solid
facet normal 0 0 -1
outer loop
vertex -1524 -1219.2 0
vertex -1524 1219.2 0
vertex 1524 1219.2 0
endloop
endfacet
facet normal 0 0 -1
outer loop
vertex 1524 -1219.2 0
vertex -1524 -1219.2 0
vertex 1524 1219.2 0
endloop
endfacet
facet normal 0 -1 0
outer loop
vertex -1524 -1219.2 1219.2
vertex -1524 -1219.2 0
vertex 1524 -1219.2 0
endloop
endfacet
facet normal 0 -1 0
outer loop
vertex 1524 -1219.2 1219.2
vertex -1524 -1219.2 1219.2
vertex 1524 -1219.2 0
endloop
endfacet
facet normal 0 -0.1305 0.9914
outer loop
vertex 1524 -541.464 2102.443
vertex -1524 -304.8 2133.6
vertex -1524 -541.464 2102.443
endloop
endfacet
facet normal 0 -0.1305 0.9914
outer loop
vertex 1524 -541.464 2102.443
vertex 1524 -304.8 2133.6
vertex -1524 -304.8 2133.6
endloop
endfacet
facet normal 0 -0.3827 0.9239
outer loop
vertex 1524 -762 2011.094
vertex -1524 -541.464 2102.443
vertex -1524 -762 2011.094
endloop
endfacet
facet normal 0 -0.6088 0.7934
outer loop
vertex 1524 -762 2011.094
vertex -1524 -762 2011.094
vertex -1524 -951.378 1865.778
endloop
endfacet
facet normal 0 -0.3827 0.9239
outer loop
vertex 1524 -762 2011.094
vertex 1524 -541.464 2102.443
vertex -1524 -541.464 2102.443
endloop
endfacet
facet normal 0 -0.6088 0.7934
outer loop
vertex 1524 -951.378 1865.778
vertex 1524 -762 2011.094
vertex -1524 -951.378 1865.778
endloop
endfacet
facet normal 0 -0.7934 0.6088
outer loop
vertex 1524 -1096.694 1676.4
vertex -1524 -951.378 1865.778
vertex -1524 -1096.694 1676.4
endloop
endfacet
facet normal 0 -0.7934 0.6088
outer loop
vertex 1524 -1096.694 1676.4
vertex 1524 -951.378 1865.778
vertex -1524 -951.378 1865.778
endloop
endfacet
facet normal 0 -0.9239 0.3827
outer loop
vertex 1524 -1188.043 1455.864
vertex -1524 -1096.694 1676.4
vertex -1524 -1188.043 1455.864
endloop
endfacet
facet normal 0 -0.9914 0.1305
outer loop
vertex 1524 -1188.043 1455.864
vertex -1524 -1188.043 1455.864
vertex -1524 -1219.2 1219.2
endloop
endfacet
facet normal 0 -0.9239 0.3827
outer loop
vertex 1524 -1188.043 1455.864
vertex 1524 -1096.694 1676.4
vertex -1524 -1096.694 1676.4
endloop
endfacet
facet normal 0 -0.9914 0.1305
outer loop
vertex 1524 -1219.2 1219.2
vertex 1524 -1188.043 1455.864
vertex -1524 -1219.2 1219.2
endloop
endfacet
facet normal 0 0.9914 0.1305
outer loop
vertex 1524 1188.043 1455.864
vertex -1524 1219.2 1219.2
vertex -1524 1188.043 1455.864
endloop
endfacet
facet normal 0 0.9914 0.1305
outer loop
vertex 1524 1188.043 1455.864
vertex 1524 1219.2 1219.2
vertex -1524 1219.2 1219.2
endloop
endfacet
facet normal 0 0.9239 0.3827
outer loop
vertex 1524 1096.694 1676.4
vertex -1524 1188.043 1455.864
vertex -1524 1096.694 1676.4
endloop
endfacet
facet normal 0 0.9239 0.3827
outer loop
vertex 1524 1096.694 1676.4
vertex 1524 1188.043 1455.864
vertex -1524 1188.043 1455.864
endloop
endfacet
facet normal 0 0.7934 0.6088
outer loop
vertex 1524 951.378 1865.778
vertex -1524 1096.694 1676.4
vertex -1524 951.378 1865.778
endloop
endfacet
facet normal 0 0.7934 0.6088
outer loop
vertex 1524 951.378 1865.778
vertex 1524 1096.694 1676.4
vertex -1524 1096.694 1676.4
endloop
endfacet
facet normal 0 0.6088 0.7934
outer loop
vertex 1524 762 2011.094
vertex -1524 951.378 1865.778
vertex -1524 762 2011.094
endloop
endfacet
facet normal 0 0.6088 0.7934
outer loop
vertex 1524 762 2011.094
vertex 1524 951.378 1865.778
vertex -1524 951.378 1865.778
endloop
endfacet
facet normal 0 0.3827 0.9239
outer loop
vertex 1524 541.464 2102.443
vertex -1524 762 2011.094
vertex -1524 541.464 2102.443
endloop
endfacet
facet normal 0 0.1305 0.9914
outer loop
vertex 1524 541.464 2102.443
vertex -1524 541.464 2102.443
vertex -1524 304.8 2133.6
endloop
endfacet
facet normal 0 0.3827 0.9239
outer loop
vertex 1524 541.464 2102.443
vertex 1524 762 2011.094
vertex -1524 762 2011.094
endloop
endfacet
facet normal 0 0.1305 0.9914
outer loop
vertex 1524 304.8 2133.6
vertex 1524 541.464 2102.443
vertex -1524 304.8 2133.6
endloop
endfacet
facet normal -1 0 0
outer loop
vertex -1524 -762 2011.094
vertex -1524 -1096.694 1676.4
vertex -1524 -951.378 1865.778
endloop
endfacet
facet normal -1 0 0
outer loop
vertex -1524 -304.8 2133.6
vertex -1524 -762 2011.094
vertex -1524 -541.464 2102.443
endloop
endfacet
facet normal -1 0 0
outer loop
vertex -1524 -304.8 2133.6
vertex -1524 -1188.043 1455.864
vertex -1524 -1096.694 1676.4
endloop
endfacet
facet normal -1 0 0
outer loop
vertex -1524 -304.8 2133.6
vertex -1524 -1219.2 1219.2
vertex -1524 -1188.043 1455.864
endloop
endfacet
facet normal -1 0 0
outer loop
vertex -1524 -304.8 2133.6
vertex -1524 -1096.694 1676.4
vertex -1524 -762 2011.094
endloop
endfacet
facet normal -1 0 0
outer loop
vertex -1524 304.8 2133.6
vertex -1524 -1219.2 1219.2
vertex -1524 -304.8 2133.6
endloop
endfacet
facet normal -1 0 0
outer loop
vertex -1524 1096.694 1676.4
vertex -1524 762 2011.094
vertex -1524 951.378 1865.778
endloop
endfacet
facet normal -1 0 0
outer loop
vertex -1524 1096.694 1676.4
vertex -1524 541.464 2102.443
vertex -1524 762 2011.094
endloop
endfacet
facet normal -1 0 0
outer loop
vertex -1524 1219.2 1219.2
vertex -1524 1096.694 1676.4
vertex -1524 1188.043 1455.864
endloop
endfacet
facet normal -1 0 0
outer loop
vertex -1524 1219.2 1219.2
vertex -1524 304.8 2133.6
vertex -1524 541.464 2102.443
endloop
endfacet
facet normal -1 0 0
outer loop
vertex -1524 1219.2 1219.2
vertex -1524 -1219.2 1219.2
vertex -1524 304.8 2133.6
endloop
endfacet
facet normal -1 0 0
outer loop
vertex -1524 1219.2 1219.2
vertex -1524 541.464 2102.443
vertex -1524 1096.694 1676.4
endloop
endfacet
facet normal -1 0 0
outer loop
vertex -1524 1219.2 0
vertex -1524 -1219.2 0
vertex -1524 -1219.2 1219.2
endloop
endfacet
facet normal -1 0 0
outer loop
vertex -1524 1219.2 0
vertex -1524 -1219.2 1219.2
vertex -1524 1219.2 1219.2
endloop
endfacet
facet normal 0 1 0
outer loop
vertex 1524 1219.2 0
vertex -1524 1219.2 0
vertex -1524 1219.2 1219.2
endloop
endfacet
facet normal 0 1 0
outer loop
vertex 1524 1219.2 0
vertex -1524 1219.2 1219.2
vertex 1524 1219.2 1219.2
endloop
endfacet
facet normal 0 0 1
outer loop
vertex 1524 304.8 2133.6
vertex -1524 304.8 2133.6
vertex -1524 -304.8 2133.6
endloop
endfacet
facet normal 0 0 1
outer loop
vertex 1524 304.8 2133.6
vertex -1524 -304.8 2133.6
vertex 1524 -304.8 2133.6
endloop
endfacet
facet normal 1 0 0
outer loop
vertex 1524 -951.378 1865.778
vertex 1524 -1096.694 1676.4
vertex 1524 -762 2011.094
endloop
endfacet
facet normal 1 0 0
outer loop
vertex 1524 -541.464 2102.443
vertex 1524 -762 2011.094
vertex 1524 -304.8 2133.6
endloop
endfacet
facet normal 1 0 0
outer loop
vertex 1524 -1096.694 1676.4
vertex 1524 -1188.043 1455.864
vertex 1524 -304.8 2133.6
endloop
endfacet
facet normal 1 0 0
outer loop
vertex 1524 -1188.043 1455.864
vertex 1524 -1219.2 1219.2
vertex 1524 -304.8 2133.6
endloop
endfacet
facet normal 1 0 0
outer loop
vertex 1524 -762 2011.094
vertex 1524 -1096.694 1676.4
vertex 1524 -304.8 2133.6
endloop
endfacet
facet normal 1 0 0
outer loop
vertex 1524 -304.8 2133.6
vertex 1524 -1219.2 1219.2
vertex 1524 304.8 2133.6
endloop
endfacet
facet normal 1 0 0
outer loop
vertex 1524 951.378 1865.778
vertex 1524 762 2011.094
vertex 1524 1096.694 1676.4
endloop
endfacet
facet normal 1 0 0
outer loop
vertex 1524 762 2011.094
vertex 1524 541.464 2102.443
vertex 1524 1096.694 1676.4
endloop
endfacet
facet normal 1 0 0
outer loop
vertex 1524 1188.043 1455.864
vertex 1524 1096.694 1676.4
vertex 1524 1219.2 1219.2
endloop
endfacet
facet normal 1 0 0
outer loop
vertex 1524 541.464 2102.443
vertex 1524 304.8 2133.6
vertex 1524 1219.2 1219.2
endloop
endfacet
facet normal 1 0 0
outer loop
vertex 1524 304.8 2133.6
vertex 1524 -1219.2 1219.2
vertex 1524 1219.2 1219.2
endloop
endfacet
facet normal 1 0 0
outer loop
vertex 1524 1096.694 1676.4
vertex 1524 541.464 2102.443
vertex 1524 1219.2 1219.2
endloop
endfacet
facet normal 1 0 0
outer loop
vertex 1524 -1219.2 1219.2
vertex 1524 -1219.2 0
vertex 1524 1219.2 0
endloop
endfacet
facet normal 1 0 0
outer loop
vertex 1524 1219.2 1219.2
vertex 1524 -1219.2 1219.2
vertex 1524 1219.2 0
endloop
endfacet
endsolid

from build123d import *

# Parameters (mm, degrees)
F0_W     = 3048
F0_H     = 2438.4
F1_DEPTH = 2133.6
F2_R     = 914.4
F3_R     = 914.4


with BuildPart() as f1:
    # F0 (on Top) → F1 (new body)
    with BuildSketch(Plane.XY):
        Rectangle(F0_W, F0_H)
    extrude(amount=F1_DEPTH)

    # F2
    f2_edges = [f1.edges().sort_by_distance(p)[0] for p in [
        (0, 1219.2, 2133.6),
    ]]
    fillet(f2_edges, radius=F2_R)

    # F3
    f3_edges = [f1.edges().sort_by_distance(p)[0] for p in [
        (0, -1219.2, 2133.6),
    ]]
    fillet(f3_edges, radius=F3_R)


solid = f1.part
